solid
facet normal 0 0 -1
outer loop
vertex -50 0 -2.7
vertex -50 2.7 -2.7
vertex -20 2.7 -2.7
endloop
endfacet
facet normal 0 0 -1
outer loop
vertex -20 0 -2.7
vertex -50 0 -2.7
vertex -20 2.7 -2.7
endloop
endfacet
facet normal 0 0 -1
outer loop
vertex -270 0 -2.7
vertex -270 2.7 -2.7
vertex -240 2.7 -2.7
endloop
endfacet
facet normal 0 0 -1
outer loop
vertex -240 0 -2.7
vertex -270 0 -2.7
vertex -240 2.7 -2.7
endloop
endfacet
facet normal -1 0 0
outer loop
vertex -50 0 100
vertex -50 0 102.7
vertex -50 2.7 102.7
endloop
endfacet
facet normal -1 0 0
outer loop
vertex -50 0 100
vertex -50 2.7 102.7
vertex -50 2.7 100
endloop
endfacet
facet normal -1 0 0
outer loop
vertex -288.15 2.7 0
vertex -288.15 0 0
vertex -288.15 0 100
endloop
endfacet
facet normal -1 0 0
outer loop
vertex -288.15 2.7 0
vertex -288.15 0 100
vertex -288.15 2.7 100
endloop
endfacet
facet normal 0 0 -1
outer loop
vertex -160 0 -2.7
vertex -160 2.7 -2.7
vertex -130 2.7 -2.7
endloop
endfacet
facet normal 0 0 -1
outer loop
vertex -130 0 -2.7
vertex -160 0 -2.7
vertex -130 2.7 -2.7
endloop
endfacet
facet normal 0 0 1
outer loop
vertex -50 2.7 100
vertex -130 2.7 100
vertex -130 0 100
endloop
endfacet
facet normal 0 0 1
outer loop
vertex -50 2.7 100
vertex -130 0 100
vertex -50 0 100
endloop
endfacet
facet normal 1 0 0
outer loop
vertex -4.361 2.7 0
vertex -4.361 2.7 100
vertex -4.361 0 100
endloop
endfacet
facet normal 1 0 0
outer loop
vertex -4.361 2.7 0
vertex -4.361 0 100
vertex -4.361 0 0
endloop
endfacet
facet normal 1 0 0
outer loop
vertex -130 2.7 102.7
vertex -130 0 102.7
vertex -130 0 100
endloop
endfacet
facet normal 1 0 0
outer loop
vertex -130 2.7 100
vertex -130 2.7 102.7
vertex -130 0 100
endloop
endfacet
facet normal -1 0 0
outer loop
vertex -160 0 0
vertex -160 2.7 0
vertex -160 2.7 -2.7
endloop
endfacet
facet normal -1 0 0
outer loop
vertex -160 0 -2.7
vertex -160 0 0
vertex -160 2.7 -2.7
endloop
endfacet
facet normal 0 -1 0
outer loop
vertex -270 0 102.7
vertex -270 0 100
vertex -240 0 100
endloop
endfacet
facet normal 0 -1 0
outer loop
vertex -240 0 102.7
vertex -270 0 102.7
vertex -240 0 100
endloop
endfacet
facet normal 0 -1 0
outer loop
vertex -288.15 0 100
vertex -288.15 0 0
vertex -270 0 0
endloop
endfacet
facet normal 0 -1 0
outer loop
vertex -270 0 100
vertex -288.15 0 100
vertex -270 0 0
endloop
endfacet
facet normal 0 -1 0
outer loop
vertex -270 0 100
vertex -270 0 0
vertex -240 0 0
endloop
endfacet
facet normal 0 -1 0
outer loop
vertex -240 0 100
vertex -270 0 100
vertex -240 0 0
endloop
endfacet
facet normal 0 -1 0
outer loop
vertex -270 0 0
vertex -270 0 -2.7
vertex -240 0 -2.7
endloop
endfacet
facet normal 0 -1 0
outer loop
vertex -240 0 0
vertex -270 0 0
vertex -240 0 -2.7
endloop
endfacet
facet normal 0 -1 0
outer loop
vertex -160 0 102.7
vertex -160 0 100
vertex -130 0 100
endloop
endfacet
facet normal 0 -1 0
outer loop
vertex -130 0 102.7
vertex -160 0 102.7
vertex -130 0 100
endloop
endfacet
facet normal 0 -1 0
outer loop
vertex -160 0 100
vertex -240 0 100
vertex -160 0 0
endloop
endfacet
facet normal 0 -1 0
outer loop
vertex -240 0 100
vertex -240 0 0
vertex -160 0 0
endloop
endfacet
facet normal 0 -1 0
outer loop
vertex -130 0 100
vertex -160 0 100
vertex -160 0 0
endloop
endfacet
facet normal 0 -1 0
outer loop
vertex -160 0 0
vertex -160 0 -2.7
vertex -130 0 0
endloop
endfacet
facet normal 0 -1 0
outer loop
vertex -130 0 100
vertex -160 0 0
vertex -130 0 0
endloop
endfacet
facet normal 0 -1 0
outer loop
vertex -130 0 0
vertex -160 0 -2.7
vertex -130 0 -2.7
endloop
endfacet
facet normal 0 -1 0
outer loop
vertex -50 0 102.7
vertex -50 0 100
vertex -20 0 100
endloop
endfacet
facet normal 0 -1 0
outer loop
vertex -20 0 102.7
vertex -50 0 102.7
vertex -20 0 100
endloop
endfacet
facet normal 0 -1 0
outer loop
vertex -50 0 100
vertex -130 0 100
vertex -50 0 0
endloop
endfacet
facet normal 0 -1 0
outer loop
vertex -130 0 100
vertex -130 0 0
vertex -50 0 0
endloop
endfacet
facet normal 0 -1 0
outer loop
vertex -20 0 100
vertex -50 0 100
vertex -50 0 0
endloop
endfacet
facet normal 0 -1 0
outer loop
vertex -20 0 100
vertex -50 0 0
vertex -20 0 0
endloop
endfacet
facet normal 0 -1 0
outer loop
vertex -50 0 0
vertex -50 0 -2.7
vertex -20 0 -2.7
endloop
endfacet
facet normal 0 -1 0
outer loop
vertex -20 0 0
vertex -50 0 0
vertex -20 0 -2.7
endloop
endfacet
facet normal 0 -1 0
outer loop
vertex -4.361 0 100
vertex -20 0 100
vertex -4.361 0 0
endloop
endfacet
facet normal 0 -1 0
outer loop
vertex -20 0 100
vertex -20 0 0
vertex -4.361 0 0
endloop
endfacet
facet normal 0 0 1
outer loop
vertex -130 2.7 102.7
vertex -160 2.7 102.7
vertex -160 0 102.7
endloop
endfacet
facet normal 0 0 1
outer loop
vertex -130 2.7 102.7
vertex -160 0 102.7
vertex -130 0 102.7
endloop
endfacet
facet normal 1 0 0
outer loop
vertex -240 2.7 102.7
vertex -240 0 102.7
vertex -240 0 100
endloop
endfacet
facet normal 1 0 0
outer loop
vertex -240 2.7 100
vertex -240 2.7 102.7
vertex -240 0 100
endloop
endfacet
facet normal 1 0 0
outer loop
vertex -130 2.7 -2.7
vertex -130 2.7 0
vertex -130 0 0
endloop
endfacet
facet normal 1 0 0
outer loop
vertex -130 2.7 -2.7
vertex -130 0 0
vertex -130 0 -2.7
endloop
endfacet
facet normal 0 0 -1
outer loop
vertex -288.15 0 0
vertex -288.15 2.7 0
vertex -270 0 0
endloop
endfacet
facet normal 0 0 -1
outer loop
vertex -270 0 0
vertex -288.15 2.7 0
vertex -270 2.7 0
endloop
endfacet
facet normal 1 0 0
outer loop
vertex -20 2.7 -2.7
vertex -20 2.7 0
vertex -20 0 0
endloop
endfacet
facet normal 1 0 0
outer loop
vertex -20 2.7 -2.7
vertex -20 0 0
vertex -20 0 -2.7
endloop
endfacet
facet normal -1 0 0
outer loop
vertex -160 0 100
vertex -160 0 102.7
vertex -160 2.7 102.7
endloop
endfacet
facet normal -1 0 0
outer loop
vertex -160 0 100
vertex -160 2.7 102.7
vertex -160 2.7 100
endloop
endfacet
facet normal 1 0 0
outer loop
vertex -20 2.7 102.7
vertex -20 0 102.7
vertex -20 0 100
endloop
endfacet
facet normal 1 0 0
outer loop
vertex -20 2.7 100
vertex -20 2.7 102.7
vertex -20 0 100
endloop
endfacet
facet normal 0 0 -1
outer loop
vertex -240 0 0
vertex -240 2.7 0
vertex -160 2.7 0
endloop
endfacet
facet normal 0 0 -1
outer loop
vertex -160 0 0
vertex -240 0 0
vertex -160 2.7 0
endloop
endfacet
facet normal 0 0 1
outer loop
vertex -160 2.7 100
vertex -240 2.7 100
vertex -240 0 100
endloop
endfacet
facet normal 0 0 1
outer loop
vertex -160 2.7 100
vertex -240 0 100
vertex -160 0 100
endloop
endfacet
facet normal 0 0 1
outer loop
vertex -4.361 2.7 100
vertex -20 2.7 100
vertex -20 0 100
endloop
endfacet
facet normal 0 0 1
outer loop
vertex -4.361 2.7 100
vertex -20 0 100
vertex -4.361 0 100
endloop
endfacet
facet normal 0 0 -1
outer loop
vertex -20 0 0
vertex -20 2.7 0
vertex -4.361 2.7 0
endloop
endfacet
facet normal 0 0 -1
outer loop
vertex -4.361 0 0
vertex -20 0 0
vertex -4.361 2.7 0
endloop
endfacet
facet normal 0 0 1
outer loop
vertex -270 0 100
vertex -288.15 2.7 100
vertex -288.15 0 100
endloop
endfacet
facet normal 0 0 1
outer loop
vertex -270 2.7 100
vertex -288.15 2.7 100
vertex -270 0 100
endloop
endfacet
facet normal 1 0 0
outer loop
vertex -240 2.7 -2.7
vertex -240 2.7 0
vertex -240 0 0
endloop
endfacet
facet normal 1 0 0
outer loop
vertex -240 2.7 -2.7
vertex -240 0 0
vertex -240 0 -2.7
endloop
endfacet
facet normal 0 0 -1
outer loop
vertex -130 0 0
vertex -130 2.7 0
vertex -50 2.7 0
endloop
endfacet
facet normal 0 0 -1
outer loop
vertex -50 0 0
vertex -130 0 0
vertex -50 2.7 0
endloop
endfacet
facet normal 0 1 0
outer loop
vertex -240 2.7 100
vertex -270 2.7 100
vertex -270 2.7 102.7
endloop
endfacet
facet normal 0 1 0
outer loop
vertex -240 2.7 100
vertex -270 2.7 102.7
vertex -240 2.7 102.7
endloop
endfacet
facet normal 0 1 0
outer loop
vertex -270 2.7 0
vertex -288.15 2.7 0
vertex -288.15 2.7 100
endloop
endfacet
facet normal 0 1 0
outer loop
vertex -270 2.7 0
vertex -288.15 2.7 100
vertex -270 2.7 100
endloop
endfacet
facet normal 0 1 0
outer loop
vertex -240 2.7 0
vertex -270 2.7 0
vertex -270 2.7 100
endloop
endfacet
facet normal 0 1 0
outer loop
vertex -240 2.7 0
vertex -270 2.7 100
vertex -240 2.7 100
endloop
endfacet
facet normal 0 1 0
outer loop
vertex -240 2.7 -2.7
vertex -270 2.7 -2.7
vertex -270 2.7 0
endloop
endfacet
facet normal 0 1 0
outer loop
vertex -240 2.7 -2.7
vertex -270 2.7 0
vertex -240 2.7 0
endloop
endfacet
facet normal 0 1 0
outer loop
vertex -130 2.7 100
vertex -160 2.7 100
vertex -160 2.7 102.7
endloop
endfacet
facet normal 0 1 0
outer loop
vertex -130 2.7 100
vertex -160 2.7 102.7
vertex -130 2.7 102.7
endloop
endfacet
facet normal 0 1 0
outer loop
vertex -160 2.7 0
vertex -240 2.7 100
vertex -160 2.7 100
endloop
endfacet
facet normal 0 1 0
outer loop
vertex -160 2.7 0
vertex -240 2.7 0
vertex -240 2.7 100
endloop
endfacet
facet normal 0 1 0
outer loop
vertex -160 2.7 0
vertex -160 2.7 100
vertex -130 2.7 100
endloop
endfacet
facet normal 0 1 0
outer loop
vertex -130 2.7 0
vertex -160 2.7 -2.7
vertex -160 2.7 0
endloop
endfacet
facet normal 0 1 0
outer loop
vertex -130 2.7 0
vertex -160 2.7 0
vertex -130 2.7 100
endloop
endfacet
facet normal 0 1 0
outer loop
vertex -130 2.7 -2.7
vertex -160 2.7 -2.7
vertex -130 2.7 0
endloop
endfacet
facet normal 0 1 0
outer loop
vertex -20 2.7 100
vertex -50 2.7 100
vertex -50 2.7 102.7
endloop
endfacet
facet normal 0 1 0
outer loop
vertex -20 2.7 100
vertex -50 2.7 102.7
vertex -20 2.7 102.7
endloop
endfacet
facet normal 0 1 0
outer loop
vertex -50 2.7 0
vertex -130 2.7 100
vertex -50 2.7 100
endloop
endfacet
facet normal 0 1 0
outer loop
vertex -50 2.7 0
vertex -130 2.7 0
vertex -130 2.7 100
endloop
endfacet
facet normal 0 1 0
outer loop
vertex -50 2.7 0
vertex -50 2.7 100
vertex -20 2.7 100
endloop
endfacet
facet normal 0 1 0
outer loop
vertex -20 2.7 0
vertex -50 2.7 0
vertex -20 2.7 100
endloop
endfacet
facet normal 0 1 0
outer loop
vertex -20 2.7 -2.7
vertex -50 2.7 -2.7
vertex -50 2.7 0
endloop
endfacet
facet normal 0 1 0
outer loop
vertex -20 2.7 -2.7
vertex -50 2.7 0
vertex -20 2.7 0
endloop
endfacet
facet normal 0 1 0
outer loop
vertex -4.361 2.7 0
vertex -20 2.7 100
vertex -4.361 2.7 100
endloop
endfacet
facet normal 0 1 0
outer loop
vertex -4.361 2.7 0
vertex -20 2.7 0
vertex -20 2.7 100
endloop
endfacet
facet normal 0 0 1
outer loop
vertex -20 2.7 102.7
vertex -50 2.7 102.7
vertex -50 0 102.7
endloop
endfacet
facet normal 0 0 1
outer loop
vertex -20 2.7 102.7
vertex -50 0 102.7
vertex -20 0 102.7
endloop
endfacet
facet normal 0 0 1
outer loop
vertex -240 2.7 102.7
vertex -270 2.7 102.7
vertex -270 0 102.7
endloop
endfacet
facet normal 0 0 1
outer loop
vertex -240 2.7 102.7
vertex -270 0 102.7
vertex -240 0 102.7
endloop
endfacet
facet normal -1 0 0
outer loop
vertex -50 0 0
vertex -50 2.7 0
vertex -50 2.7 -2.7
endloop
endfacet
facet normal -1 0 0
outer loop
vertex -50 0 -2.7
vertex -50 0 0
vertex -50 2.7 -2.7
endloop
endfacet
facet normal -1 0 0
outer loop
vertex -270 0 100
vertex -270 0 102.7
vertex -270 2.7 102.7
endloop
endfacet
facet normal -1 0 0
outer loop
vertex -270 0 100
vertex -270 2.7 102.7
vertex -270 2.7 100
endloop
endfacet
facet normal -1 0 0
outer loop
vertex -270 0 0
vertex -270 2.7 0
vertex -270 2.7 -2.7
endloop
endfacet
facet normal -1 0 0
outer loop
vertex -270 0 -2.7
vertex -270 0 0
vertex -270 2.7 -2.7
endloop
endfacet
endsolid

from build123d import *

# Parameters (mm, degrees)
SKETCH1_W           = 300
SKETCH1_H           = 2.7
BOSS_EXTRUDE1_DEPTH = 100
SKETCH3_W           = 30
SKETCH3_H           = 2.7
BOSS_EXTRUDE2_DEPTH = 2.7
SKETCH4_W           = 11.849818602
SKETCH4_H           = 2.7
CUT_EXTRUDE1_DEPTH  = 318.103421615
SKETCH5_W           = 4.361423596
SKETCH5_H           = 100
CUT_EXTRUDE2_DEPTH  = 2.7


with BuildPart() as part:
    # Sketch1 → Boss-Extrude1 (new body)
    with BuildSketch(Plane.XY):
        with Locations((-150, 1.35)):
            Rectangle(SKETCH1_W, SKETCH1_H)
    extrude(amount=BOSS_EXTRUDE1_DEPTH)

    # Sketch3 → Boss-Extrude2 (add)
    with BuildSketch(Plane(origin=(0, 2.7, 0), x_dir=(1, 0, 0), z_dir=(0, 1, 0))):
        with Locations((-35, 1.35)):
            Rectangle(SKETCH3_W, SKETCH3_H)
        with Locations((-145, 1.35)):
            Rectangle(SKETCH3_W, SKETCH3_H)
        with Locations((-255, 1.35)):
            Rectangle(SKETCH3_W, SKETCH3_H)
        with Locations((-255, -101.35)):
            Rectangle(SKETCH3_W, SKETCH3_H)
        with Locations((-145, -101.35)):
            Rectangle(SKETCH3_W, SKETCH3_H)
        with Locations((-35, -101.35)):
            Rectangle(SKETCH3_W, SKETCH3_H)
    extrude(amount=-BOSS_EXTRUDE2_DEPTH)

    # Sketch4 → Cut-Extrude1 (cut, through all)
    with BuildSketch(Plane(origin=(0, 0, 0), x_dir=(-1, 0, 0), z_dir=(0, 0, -1))):
        with Locations((294.075090699, 1.35)):
            Rectangle(SKETCH4_W, SKETCH4_H)
    extrude(amount=-CUT_EXTRUDE1_DEPTH, mode=Mode.SUBTRACT)

    # Sketch5 → Cut-Extrude2 (cut)
    with BuildSketch(Plane(origin=(0, 2.7, 0), x_dir=(1, 0, 0), z_dir=(0, 1, 0))):
        with Locations((-2.180711798, -50)):
            Rectangle(SKETCH5_W, SKETCH5_H)
    extrude(amount=-CUT_EXTRUDE2_DEPTH, mode=Mode.SUBTRACT)


solid = part.part
